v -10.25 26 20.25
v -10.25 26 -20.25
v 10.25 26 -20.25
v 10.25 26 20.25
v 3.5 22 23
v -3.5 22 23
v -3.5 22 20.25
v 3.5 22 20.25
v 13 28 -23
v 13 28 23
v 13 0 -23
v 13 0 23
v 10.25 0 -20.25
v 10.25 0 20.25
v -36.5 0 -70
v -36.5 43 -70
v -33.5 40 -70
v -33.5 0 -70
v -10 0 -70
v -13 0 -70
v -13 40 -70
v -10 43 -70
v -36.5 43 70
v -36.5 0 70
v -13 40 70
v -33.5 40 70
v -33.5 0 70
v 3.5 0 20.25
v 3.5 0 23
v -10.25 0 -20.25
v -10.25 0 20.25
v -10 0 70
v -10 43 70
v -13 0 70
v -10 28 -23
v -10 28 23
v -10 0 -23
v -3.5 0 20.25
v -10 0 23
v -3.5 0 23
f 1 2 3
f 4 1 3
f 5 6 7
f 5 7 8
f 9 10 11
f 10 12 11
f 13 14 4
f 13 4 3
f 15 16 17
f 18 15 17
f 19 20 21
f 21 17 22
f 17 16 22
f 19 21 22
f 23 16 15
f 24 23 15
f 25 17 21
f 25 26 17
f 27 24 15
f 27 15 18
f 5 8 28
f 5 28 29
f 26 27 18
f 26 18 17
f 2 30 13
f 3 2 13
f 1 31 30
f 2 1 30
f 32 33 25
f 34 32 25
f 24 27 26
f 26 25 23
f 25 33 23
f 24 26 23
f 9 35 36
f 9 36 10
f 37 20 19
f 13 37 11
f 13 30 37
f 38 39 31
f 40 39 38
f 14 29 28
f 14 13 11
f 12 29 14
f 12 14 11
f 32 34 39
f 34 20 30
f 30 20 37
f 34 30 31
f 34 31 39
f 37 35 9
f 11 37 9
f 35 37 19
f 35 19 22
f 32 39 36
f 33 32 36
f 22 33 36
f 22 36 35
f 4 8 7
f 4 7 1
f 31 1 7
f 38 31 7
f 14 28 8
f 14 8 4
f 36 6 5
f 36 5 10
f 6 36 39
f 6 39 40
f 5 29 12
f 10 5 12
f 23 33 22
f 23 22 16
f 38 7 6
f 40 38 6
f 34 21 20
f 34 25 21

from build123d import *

# Parameters (mm, degrees)
SKETCH1_W            = 26
SKETCH1_H            = 46
SKETCH1_W_2          = 20.5
SKETCH1_H_2          = 40.5
BOSS_EXTRUDE1_DEPTH  = 26
SKETCH2_W            = 26
SKETCH2_H            = 46
BOSS_EXTRUDE2_DEPTH  = 2
SKETCH3_W            = 7
SKETCH3_H            = 3
CUT_EXTRUDE1_DEPTH   = 22
SKETCH6_W            = 3
SKETCH6_H            = 40
BOSS_EXTRUDE5_DEPTH  = 7
SKETCH7_W            = 3
SKETCH7_H            = 40
BOSS_EXTRUDE6_DEPTH  = 7
SKETCH8_W            = 46
SKETCH8_H            = 12
BOSS_EXTRUDE7_DEPTH  = 3
SKETCH10_W           = 23.5
SKETCH10_H           = 60
BOSS_EXTRUDE8_DEPTH  = 3
SKETCH11_W           = 60
SKETCH11_H           = 43
BOSS_EXTRUDE9_DEPTH  = 3
BOSS_EXTRUDE10_DEPTH = 40
BOSS_EXTRUDE11_DEPTH = 40


with BuildPart() as part:
    # Sketch1 → Boss-Extrude1 (new body)
    with BuildSketch(Plane(origin=(0, 0, 0), x_dir=(1, 0, 0), z_dir=(0, 1, 0))):
        Rectangle(SKETCH1_W, SKETCH1_H)
        Rectangle(SKETCH1_W_2, SKETCH1_H_2, mode=Mode.SUBTRACT)
    extrude(amount=BOSS_EXTRUDE1_DEPTH)

    # Sketch2 → Boss-Extrude2 (add)
    with BuildSketch(Plane(origin=(0, 26, 0), x_dir=(1, 0, 0), z_dir=(0, 1, 0))):
        Rectangle(SKETCH2_W, SKETCH2_H)
    extrude(amount=BOSS_EXTRUDE2_DEPTH)

    # Sketch3 → Cut-Extrude1 (cut)
    with BuildSketch(Plane.XZ):
        with Locations((0, 21.5)):
            Rectangle(SKETCH3_W, SKETCH3_H)
    extrude(amount=-CUT_EXTRUDE1_DEPTH, mode=Mode.SUBTRACT)

    # Sketch6 → Boss-Extrude5 (add)
    with BuildSketch(Plane.XY.offset(23)):
        with Locations((-11.5, 20)):
            Rectangle(SKETCH6_W, SKETCH6_H)
    extrude(amount=BOSS_EXTRUDE5_DEPTH)

    # Sketch7 → Boss-Extrude6 (add)
    with BuildSketch(Plane(origin=(0, 0, -23), x_dir=(-1, 0, 0), z_dir=(0, 0, -1))):
        with Locations((11.5, 20)):
            Rectangle(SKETCH7_W, SKETCH7_H)
    extrude(amount=BOSS_EXTRUDE6_DEPTH)

    # Sketch8 → Boss-Extrude7 (add)
    with BuildSketch(Plane(origin=(-10, 0, 0), x_dir=(0, 0, -1), z_dir=(1, 0, 0))):
        with Locations((0, 34)):
            Rectangle(SKETCH8_W, SKETCH8_H)
    extrude(amount=-BOSS_EXTRUDE7_DEPTH)

    # Sketch10 → Boss-Extrude8 (add)
    with BuildSketch(Plane(origin=(0, 40, 0), x_dir=(1, 0, 0), z_dir=(0, 1, 0))):
        with Locations((-21.75, 0)):
            Rectangle(SKETCH10_W, SKETCH10_H)
    extrude(amount=BOSS_EXTRUDE8_DEPTH)

    # Sketch11 → Boss-Extrude9 (add)
    with BuildSketch(Plane.ZY.offset(33.5)):
        with Locations((0, 21.5)):
            Rectangle(SKETCH11_W, SKETCH11_H)
    extrude(amount=BOSS_EXTRUDE9_DEPTH)

    # Sketch12 → Boss-Extrude10 (add)
    with BuildSketch(Plane.XY.offset(30)):
        Polygon((-33.5, 0), (-36.5, 0), (-36.5, 43), (-10, 43), (-10, 0), (-13, 0), (-13, 40), (-33.5, 40), align=None)
    extrude(amount=BOSS_EXTRUDE10_DEPTH)

    # Sketch13 → Boss-Extrude11 (add)
    with BuildSketch(Plane(origin=(0, 0, -30), x_dir=(-1, 0, 0), z_dir=(0, 0, -1))):
        Polygon((13, 0), (10, 0), (10, 43), (36.5, 43), (36.5, 0), (33.5, 0), (33.5, 40), (13, 40), align=None)
    extrude(amount=BOSS_EXTRUDE11_DEPTH)


solid = part.part
